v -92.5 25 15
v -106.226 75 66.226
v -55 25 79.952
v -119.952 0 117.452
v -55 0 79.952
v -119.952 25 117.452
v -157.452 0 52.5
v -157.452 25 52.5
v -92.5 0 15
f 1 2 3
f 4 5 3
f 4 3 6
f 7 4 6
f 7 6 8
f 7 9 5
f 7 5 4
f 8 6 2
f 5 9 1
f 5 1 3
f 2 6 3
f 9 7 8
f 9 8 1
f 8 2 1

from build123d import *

# Parameters (mm, degrees)
EXTRUDE1_DEPTH = 75
EXTRUDE2_DEPTH = 108.475952642
EXTRUDE3_DEPTH = 108.475952642


with BuildPart() as part:
    # Sketch1 → Extrude1 (new body)
    with BuildSketch(Plane(origin=(0, 0, 0), x_dir=(1, 0, 0), z_dir=(0, 1, 0))):
        Polygon((-92.5, -15), (-55, -79.951905284), (-119.951905284, -117.451905284), (-157.451905284, -52.5), align=None)
    extrude(amount=EXTRUDE1_DEPTH)

    # Sketch2 → Extrude2 (cut, through all)
    with BuildSketch(Plane(origin=(20.870190528, 0, 36.148230359), x_dir=(0.866025404, 0, -0.5), z_dir=(0.5, 0, 0.866025404))):
        Polygon((-162.60734985, 25), (-125.10734985, 75), (-162.60734985, 75), align=None)
        Polygon((-87.60734985, 75), (-125.10734985, 75), (-87.60734985, 25), align=None)
    extrude(amount=-EXTRUDE2_DEPTH, mode=Mode.SUBTRACT)

    # Sketch3 → Extrude3 (cut, through all)
    with BuildSketch(Plane(origin=(-140.822095812, 0, 81.303674925), x_dir=(0.5, 0, 0.866025404), z_dir=(-0.866025404, 0, 0.5))):
        Polygon((-33.259618943, 75), (4.240381057, 75), (-33.259618943, 25), align=None)
        Polygon((41.740381057, 75), (41.740381057, 25), (4.240381057, 75), align=None)
    extrude(amount=-EXTRUDE3_DEPTH, mode=Mode.SUBTRACT)


solid = part.part
